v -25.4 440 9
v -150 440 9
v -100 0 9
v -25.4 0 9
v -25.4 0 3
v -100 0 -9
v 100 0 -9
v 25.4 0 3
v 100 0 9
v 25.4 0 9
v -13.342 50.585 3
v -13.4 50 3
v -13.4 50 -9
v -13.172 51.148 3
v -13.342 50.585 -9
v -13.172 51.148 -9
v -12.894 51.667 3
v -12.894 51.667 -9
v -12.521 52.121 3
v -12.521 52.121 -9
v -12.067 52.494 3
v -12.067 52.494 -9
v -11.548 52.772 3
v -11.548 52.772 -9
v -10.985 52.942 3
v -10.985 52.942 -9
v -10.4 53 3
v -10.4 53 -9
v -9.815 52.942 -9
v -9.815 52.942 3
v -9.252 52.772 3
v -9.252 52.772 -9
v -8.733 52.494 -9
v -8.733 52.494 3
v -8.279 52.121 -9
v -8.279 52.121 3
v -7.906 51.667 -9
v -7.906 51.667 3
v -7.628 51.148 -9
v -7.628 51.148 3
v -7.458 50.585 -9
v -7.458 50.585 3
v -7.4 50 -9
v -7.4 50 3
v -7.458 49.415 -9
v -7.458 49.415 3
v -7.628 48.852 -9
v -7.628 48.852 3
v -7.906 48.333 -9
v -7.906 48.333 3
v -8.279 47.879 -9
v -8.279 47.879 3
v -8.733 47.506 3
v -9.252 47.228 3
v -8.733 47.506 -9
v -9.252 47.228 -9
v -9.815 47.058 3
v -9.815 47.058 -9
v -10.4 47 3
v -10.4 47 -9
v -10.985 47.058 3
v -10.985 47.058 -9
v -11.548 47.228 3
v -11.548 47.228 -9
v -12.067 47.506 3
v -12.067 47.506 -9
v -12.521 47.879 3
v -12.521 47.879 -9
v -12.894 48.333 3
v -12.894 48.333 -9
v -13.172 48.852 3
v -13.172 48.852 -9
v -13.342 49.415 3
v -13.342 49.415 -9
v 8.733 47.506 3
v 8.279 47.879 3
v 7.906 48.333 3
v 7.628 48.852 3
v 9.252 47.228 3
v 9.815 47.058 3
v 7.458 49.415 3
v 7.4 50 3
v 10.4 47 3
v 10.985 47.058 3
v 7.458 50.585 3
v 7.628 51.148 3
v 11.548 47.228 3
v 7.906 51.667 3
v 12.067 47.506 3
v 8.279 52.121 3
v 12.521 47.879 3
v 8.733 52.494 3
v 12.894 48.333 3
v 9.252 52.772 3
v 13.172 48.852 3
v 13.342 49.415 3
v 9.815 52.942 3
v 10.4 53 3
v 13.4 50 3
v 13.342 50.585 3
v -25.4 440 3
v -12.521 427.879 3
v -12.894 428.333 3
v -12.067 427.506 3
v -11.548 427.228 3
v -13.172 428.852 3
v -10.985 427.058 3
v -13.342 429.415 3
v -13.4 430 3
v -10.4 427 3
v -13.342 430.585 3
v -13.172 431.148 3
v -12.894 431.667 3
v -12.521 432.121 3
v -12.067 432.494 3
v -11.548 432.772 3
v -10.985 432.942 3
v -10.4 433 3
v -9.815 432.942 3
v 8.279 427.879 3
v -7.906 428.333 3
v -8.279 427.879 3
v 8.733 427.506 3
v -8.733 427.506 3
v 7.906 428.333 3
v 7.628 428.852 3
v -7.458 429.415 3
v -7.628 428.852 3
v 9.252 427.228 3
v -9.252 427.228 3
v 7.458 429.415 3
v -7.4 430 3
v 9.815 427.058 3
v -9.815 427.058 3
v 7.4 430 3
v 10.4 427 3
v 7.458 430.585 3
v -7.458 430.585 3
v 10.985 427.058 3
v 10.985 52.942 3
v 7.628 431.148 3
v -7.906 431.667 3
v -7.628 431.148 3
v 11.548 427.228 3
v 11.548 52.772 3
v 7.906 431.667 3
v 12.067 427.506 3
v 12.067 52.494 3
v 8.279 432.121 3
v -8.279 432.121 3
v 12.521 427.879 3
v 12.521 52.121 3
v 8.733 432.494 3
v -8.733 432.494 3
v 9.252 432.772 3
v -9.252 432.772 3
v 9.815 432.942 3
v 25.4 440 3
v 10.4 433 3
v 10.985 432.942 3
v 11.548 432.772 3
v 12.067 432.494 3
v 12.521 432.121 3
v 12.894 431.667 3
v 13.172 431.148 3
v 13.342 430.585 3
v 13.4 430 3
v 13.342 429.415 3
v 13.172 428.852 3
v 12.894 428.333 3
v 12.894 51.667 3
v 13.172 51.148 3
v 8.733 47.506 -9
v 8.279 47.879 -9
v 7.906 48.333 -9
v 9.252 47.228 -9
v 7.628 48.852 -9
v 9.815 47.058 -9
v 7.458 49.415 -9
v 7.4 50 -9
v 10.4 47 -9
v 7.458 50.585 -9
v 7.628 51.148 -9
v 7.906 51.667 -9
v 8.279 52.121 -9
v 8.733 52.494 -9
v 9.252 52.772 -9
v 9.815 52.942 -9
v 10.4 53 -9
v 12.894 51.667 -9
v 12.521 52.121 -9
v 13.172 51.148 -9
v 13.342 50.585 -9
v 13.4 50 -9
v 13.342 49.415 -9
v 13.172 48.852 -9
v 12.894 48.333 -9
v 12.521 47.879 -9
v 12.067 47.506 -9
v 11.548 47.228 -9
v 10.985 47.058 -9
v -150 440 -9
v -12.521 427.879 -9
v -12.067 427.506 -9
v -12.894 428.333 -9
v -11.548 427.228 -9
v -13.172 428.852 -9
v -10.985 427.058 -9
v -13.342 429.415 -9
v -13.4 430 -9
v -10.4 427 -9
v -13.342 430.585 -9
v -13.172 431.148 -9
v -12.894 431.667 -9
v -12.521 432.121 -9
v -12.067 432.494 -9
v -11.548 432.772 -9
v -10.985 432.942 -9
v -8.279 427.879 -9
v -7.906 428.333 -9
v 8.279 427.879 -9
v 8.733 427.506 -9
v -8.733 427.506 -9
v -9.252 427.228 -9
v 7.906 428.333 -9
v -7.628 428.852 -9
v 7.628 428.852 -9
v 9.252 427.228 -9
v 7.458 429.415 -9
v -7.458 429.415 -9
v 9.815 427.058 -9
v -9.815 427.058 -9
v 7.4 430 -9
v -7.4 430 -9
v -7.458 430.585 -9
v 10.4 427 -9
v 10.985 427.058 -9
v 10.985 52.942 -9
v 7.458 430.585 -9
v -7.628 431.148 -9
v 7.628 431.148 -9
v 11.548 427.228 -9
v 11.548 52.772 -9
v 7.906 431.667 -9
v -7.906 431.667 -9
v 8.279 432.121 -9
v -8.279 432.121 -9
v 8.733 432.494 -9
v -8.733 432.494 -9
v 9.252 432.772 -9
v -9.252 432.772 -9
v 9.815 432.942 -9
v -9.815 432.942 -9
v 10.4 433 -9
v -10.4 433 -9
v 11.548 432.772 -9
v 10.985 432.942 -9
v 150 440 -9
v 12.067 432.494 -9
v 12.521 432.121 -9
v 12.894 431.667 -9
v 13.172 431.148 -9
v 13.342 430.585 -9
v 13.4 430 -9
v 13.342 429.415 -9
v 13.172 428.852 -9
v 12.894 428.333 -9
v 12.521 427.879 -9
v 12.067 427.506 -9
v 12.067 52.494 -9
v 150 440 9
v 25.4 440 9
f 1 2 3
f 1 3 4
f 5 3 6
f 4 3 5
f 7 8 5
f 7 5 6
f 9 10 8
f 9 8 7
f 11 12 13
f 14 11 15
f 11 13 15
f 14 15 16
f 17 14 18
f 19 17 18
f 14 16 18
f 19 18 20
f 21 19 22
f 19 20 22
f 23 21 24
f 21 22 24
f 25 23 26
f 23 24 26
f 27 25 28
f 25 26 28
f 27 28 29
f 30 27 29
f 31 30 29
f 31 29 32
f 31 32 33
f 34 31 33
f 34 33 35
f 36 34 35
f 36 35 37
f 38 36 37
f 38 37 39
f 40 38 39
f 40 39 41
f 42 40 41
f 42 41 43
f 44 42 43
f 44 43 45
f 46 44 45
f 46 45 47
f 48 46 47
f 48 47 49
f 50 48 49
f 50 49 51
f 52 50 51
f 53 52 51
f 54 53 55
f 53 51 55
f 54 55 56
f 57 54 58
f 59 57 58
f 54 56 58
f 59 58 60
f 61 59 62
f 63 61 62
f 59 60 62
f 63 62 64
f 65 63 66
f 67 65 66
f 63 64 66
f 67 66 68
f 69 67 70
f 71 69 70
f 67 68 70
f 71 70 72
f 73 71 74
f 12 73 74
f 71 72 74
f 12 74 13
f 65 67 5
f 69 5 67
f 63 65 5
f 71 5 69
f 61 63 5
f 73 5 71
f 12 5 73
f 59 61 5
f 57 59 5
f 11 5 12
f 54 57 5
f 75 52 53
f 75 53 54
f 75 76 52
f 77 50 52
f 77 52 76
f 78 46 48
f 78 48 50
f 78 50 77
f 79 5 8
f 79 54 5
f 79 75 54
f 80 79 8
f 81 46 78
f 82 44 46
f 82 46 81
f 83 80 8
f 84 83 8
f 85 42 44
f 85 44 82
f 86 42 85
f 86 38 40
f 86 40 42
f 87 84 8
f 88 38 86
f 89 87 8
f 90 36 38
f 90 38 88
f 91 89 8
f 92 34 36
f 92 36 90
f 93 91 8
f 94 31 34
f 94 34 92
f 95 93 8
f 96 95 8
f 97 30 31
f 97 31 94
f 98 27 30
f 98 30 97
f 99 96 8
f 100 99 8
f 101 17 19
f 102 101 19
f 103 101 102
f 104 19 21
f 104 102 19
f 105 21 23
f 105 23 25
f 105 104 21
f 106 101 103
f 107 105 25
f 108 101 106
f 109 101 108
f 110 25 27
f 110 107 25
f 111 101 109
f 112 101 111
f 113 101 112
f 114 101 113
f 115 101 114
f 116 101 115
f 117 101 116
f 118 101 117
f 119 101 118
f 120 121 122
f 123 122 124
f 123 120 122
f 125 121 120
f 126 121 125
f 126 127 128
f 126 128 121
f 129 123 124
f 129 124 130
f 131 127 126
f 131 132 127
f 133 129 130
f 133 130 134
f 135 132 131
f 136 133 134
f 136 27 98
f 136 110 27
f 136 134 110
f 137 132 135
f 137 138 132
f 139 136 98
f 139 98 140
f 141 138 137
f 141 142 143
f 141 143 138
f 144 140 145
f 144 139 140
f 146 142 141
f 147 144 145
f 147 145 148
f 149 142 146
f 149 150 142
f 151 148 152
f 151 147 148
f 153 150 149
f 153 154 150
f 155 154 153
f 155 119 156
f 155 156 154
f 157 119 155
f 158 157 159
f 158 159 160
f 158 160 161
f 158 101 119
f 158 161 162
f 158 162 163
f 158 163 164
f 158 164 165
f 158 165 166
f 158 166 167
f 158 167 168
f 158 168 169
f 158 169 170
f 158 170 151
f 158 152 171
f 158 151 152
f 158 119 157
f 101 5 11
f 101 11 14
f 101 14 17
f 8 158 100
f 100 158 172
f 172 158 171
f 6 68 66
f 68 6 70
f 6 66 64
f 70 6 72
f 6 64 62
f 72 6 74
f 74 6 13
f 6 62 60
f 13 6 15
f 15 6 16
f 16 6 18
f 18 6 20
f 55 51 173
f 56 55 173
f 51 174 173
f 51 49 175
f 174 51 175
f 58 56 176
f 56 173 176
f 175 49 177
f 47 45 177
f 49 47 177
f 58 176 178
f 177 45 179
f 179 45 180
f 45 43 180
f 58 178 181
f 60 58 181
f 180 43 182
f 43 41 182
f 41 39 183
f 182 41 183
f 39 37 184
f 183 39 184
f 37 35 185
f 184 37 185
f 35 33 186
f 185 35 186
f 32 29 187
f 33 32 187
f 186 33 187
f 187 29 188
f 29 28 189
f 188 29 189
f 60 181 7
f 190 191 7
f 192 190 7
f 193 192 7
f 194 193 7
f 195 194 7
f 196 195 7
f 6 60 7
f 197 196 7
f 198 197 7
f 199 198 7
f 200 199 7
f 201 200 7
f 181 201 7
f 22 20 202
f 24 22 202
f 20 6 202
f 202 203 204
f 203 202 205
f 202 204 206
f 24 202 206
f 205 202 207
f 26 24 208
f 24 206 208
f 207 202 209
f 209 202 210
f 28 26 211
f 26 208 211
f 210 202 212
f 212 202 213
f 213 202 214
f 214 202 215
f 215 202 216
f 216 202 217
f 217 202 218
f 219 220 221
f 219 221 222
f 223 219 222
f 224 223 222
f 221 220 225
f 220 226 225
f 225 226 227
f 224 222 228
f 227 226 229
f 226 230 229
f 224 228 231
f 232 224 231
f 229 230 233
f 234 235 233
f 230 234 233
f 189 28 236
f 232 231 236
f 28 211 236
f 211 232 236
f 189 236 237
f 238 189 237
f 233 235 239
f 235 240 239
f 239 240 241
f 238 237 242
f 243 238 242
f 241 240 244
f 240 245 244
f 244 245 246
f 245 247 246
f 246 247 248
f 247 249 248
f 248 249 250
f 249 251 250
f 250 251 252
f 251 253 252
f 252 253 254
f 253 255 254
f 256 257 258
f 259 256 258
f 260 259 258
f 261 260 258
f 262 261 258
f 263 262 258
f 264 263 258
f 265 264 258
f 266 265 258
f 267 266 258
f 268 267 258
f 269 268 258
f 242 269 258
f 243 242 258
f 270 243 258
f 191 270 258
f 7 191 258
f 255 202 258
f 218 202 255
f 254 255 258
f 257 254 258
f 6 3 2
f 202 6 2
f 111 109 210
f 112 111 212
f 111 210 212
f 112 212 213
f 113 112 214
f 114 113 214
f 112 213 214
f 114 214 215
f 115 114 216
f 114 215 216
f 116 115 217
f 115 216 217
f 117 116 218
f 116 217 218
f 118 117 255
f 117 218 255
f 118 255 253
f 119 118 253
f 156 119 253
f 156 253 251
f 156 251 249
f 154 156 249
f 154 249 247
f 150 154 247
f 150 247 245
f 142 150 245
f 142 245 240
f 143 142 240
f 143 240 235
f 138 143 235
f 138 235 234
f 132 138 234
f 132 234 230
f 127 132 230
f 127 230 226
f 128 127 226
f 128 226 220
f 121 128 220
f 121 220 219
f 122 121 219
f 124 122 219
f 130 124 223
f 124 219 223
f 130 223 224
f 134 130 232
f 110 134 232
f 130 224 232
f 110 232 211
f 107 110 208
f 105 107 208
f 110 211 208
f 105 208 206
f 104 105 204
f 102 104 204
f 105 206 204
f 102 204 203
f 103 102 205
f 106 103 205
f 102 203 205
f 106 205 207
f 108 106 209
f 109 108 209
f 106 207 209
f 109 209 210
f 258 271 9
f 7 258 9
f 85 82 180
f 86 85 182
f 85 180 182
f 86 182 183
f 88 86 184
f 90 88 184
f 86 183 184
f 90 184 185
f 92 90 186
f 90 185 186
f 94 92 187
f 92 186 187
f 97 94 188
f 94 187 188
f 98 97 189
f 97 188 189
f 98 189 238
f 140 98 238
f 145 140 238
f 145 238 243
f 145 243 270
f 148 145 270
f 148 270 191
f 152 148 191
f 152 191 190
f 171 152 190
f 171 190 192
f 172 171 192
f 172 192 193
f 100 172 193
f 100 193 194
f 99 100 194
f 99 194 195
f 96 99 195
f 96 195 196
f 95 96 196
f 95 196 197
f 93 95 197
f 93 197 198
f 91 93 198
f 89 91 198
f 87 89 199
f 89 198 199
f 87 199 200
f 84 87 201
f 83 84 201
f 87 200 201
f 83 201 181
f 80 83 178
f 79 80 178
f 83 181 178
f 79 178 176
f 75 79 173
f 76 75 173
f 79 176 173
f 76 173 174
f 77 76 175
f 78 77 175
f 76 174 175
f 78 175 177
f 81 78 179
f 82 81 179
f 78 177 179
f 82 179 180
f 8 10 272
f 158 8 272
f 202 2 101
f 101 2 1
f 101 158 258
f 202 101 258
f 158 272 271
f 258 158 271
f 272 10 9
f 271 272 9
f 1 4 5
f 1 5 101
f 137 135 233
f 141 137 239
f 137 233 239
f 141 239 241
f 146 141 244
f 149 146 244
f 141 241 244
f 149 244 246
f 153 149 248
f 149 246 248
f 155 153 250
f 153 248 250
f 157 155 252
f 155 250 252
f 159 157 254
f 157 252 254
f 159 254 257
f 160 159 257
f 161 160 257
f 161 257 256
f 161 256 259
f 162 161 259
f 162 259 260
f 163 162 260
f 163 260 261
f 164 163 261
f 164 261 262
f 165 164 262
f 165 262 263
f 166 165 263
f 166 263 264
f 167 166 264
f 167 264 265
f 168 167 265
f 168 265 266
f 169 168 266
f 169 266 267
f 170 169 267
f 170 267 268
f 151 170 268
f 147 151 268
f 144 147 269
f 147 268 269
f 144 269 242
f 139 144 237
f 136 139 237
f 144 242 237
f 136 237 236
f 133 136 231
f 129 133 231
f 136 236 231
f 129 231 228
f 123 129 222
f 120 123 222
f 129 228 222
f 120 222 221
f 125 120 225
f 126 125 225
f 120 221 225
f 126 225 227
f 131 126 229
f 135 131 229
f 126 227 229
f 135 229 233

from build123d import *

# Parameters (mm, degrees)
F0_W     = 800
F0_H     = 440
F1_DEPTH = 9
F3_DEPTH = 40
F4_W     = 50.8
F4_H     = 440
F5_DEPTH = 6
F7_D     = 6


with BuildPart() as f1:
    # F0 (on Top) → F1 (new body, symmetric)
    with BuildSketch(Plane.XY):
        with Locations((0, 220)):
            Rectangle(F0_W, F0_H)
    extrude(amount=F1_DEPTH, both=True)

    # F2 (on face) → F3 (cut)
    with BuildSketch(Plane.XY.offset(9)):
        Polygon((-400, 0), (-100, 0), (-150, 440), (-400, 440), align=None)
        Polygon((150, 440), (100, 0), (400, 0), (400, 440), align=None)
    extrude(amount=-F3_DEPTH, mode=Mode.SUBTRACT)

    # F4 (on face) → F5 (cut)
    with BuildSketch(Plane.XY.offset(9)):
        with Locations((0, 220)):
            Rectangle(F4_W, F4_H)
    extrude(amount=-F5_DEPTH, mode=Mode.SUBTRACT)

    # F7 (through all)
    with Locations(Plane.XY.offset(3)):
        with Locations((-10.4, 430), (10.4, 430), (10.4, 50), (-10.4, 50)):
            Hole(F7_D / 2)


solid = f1.part
